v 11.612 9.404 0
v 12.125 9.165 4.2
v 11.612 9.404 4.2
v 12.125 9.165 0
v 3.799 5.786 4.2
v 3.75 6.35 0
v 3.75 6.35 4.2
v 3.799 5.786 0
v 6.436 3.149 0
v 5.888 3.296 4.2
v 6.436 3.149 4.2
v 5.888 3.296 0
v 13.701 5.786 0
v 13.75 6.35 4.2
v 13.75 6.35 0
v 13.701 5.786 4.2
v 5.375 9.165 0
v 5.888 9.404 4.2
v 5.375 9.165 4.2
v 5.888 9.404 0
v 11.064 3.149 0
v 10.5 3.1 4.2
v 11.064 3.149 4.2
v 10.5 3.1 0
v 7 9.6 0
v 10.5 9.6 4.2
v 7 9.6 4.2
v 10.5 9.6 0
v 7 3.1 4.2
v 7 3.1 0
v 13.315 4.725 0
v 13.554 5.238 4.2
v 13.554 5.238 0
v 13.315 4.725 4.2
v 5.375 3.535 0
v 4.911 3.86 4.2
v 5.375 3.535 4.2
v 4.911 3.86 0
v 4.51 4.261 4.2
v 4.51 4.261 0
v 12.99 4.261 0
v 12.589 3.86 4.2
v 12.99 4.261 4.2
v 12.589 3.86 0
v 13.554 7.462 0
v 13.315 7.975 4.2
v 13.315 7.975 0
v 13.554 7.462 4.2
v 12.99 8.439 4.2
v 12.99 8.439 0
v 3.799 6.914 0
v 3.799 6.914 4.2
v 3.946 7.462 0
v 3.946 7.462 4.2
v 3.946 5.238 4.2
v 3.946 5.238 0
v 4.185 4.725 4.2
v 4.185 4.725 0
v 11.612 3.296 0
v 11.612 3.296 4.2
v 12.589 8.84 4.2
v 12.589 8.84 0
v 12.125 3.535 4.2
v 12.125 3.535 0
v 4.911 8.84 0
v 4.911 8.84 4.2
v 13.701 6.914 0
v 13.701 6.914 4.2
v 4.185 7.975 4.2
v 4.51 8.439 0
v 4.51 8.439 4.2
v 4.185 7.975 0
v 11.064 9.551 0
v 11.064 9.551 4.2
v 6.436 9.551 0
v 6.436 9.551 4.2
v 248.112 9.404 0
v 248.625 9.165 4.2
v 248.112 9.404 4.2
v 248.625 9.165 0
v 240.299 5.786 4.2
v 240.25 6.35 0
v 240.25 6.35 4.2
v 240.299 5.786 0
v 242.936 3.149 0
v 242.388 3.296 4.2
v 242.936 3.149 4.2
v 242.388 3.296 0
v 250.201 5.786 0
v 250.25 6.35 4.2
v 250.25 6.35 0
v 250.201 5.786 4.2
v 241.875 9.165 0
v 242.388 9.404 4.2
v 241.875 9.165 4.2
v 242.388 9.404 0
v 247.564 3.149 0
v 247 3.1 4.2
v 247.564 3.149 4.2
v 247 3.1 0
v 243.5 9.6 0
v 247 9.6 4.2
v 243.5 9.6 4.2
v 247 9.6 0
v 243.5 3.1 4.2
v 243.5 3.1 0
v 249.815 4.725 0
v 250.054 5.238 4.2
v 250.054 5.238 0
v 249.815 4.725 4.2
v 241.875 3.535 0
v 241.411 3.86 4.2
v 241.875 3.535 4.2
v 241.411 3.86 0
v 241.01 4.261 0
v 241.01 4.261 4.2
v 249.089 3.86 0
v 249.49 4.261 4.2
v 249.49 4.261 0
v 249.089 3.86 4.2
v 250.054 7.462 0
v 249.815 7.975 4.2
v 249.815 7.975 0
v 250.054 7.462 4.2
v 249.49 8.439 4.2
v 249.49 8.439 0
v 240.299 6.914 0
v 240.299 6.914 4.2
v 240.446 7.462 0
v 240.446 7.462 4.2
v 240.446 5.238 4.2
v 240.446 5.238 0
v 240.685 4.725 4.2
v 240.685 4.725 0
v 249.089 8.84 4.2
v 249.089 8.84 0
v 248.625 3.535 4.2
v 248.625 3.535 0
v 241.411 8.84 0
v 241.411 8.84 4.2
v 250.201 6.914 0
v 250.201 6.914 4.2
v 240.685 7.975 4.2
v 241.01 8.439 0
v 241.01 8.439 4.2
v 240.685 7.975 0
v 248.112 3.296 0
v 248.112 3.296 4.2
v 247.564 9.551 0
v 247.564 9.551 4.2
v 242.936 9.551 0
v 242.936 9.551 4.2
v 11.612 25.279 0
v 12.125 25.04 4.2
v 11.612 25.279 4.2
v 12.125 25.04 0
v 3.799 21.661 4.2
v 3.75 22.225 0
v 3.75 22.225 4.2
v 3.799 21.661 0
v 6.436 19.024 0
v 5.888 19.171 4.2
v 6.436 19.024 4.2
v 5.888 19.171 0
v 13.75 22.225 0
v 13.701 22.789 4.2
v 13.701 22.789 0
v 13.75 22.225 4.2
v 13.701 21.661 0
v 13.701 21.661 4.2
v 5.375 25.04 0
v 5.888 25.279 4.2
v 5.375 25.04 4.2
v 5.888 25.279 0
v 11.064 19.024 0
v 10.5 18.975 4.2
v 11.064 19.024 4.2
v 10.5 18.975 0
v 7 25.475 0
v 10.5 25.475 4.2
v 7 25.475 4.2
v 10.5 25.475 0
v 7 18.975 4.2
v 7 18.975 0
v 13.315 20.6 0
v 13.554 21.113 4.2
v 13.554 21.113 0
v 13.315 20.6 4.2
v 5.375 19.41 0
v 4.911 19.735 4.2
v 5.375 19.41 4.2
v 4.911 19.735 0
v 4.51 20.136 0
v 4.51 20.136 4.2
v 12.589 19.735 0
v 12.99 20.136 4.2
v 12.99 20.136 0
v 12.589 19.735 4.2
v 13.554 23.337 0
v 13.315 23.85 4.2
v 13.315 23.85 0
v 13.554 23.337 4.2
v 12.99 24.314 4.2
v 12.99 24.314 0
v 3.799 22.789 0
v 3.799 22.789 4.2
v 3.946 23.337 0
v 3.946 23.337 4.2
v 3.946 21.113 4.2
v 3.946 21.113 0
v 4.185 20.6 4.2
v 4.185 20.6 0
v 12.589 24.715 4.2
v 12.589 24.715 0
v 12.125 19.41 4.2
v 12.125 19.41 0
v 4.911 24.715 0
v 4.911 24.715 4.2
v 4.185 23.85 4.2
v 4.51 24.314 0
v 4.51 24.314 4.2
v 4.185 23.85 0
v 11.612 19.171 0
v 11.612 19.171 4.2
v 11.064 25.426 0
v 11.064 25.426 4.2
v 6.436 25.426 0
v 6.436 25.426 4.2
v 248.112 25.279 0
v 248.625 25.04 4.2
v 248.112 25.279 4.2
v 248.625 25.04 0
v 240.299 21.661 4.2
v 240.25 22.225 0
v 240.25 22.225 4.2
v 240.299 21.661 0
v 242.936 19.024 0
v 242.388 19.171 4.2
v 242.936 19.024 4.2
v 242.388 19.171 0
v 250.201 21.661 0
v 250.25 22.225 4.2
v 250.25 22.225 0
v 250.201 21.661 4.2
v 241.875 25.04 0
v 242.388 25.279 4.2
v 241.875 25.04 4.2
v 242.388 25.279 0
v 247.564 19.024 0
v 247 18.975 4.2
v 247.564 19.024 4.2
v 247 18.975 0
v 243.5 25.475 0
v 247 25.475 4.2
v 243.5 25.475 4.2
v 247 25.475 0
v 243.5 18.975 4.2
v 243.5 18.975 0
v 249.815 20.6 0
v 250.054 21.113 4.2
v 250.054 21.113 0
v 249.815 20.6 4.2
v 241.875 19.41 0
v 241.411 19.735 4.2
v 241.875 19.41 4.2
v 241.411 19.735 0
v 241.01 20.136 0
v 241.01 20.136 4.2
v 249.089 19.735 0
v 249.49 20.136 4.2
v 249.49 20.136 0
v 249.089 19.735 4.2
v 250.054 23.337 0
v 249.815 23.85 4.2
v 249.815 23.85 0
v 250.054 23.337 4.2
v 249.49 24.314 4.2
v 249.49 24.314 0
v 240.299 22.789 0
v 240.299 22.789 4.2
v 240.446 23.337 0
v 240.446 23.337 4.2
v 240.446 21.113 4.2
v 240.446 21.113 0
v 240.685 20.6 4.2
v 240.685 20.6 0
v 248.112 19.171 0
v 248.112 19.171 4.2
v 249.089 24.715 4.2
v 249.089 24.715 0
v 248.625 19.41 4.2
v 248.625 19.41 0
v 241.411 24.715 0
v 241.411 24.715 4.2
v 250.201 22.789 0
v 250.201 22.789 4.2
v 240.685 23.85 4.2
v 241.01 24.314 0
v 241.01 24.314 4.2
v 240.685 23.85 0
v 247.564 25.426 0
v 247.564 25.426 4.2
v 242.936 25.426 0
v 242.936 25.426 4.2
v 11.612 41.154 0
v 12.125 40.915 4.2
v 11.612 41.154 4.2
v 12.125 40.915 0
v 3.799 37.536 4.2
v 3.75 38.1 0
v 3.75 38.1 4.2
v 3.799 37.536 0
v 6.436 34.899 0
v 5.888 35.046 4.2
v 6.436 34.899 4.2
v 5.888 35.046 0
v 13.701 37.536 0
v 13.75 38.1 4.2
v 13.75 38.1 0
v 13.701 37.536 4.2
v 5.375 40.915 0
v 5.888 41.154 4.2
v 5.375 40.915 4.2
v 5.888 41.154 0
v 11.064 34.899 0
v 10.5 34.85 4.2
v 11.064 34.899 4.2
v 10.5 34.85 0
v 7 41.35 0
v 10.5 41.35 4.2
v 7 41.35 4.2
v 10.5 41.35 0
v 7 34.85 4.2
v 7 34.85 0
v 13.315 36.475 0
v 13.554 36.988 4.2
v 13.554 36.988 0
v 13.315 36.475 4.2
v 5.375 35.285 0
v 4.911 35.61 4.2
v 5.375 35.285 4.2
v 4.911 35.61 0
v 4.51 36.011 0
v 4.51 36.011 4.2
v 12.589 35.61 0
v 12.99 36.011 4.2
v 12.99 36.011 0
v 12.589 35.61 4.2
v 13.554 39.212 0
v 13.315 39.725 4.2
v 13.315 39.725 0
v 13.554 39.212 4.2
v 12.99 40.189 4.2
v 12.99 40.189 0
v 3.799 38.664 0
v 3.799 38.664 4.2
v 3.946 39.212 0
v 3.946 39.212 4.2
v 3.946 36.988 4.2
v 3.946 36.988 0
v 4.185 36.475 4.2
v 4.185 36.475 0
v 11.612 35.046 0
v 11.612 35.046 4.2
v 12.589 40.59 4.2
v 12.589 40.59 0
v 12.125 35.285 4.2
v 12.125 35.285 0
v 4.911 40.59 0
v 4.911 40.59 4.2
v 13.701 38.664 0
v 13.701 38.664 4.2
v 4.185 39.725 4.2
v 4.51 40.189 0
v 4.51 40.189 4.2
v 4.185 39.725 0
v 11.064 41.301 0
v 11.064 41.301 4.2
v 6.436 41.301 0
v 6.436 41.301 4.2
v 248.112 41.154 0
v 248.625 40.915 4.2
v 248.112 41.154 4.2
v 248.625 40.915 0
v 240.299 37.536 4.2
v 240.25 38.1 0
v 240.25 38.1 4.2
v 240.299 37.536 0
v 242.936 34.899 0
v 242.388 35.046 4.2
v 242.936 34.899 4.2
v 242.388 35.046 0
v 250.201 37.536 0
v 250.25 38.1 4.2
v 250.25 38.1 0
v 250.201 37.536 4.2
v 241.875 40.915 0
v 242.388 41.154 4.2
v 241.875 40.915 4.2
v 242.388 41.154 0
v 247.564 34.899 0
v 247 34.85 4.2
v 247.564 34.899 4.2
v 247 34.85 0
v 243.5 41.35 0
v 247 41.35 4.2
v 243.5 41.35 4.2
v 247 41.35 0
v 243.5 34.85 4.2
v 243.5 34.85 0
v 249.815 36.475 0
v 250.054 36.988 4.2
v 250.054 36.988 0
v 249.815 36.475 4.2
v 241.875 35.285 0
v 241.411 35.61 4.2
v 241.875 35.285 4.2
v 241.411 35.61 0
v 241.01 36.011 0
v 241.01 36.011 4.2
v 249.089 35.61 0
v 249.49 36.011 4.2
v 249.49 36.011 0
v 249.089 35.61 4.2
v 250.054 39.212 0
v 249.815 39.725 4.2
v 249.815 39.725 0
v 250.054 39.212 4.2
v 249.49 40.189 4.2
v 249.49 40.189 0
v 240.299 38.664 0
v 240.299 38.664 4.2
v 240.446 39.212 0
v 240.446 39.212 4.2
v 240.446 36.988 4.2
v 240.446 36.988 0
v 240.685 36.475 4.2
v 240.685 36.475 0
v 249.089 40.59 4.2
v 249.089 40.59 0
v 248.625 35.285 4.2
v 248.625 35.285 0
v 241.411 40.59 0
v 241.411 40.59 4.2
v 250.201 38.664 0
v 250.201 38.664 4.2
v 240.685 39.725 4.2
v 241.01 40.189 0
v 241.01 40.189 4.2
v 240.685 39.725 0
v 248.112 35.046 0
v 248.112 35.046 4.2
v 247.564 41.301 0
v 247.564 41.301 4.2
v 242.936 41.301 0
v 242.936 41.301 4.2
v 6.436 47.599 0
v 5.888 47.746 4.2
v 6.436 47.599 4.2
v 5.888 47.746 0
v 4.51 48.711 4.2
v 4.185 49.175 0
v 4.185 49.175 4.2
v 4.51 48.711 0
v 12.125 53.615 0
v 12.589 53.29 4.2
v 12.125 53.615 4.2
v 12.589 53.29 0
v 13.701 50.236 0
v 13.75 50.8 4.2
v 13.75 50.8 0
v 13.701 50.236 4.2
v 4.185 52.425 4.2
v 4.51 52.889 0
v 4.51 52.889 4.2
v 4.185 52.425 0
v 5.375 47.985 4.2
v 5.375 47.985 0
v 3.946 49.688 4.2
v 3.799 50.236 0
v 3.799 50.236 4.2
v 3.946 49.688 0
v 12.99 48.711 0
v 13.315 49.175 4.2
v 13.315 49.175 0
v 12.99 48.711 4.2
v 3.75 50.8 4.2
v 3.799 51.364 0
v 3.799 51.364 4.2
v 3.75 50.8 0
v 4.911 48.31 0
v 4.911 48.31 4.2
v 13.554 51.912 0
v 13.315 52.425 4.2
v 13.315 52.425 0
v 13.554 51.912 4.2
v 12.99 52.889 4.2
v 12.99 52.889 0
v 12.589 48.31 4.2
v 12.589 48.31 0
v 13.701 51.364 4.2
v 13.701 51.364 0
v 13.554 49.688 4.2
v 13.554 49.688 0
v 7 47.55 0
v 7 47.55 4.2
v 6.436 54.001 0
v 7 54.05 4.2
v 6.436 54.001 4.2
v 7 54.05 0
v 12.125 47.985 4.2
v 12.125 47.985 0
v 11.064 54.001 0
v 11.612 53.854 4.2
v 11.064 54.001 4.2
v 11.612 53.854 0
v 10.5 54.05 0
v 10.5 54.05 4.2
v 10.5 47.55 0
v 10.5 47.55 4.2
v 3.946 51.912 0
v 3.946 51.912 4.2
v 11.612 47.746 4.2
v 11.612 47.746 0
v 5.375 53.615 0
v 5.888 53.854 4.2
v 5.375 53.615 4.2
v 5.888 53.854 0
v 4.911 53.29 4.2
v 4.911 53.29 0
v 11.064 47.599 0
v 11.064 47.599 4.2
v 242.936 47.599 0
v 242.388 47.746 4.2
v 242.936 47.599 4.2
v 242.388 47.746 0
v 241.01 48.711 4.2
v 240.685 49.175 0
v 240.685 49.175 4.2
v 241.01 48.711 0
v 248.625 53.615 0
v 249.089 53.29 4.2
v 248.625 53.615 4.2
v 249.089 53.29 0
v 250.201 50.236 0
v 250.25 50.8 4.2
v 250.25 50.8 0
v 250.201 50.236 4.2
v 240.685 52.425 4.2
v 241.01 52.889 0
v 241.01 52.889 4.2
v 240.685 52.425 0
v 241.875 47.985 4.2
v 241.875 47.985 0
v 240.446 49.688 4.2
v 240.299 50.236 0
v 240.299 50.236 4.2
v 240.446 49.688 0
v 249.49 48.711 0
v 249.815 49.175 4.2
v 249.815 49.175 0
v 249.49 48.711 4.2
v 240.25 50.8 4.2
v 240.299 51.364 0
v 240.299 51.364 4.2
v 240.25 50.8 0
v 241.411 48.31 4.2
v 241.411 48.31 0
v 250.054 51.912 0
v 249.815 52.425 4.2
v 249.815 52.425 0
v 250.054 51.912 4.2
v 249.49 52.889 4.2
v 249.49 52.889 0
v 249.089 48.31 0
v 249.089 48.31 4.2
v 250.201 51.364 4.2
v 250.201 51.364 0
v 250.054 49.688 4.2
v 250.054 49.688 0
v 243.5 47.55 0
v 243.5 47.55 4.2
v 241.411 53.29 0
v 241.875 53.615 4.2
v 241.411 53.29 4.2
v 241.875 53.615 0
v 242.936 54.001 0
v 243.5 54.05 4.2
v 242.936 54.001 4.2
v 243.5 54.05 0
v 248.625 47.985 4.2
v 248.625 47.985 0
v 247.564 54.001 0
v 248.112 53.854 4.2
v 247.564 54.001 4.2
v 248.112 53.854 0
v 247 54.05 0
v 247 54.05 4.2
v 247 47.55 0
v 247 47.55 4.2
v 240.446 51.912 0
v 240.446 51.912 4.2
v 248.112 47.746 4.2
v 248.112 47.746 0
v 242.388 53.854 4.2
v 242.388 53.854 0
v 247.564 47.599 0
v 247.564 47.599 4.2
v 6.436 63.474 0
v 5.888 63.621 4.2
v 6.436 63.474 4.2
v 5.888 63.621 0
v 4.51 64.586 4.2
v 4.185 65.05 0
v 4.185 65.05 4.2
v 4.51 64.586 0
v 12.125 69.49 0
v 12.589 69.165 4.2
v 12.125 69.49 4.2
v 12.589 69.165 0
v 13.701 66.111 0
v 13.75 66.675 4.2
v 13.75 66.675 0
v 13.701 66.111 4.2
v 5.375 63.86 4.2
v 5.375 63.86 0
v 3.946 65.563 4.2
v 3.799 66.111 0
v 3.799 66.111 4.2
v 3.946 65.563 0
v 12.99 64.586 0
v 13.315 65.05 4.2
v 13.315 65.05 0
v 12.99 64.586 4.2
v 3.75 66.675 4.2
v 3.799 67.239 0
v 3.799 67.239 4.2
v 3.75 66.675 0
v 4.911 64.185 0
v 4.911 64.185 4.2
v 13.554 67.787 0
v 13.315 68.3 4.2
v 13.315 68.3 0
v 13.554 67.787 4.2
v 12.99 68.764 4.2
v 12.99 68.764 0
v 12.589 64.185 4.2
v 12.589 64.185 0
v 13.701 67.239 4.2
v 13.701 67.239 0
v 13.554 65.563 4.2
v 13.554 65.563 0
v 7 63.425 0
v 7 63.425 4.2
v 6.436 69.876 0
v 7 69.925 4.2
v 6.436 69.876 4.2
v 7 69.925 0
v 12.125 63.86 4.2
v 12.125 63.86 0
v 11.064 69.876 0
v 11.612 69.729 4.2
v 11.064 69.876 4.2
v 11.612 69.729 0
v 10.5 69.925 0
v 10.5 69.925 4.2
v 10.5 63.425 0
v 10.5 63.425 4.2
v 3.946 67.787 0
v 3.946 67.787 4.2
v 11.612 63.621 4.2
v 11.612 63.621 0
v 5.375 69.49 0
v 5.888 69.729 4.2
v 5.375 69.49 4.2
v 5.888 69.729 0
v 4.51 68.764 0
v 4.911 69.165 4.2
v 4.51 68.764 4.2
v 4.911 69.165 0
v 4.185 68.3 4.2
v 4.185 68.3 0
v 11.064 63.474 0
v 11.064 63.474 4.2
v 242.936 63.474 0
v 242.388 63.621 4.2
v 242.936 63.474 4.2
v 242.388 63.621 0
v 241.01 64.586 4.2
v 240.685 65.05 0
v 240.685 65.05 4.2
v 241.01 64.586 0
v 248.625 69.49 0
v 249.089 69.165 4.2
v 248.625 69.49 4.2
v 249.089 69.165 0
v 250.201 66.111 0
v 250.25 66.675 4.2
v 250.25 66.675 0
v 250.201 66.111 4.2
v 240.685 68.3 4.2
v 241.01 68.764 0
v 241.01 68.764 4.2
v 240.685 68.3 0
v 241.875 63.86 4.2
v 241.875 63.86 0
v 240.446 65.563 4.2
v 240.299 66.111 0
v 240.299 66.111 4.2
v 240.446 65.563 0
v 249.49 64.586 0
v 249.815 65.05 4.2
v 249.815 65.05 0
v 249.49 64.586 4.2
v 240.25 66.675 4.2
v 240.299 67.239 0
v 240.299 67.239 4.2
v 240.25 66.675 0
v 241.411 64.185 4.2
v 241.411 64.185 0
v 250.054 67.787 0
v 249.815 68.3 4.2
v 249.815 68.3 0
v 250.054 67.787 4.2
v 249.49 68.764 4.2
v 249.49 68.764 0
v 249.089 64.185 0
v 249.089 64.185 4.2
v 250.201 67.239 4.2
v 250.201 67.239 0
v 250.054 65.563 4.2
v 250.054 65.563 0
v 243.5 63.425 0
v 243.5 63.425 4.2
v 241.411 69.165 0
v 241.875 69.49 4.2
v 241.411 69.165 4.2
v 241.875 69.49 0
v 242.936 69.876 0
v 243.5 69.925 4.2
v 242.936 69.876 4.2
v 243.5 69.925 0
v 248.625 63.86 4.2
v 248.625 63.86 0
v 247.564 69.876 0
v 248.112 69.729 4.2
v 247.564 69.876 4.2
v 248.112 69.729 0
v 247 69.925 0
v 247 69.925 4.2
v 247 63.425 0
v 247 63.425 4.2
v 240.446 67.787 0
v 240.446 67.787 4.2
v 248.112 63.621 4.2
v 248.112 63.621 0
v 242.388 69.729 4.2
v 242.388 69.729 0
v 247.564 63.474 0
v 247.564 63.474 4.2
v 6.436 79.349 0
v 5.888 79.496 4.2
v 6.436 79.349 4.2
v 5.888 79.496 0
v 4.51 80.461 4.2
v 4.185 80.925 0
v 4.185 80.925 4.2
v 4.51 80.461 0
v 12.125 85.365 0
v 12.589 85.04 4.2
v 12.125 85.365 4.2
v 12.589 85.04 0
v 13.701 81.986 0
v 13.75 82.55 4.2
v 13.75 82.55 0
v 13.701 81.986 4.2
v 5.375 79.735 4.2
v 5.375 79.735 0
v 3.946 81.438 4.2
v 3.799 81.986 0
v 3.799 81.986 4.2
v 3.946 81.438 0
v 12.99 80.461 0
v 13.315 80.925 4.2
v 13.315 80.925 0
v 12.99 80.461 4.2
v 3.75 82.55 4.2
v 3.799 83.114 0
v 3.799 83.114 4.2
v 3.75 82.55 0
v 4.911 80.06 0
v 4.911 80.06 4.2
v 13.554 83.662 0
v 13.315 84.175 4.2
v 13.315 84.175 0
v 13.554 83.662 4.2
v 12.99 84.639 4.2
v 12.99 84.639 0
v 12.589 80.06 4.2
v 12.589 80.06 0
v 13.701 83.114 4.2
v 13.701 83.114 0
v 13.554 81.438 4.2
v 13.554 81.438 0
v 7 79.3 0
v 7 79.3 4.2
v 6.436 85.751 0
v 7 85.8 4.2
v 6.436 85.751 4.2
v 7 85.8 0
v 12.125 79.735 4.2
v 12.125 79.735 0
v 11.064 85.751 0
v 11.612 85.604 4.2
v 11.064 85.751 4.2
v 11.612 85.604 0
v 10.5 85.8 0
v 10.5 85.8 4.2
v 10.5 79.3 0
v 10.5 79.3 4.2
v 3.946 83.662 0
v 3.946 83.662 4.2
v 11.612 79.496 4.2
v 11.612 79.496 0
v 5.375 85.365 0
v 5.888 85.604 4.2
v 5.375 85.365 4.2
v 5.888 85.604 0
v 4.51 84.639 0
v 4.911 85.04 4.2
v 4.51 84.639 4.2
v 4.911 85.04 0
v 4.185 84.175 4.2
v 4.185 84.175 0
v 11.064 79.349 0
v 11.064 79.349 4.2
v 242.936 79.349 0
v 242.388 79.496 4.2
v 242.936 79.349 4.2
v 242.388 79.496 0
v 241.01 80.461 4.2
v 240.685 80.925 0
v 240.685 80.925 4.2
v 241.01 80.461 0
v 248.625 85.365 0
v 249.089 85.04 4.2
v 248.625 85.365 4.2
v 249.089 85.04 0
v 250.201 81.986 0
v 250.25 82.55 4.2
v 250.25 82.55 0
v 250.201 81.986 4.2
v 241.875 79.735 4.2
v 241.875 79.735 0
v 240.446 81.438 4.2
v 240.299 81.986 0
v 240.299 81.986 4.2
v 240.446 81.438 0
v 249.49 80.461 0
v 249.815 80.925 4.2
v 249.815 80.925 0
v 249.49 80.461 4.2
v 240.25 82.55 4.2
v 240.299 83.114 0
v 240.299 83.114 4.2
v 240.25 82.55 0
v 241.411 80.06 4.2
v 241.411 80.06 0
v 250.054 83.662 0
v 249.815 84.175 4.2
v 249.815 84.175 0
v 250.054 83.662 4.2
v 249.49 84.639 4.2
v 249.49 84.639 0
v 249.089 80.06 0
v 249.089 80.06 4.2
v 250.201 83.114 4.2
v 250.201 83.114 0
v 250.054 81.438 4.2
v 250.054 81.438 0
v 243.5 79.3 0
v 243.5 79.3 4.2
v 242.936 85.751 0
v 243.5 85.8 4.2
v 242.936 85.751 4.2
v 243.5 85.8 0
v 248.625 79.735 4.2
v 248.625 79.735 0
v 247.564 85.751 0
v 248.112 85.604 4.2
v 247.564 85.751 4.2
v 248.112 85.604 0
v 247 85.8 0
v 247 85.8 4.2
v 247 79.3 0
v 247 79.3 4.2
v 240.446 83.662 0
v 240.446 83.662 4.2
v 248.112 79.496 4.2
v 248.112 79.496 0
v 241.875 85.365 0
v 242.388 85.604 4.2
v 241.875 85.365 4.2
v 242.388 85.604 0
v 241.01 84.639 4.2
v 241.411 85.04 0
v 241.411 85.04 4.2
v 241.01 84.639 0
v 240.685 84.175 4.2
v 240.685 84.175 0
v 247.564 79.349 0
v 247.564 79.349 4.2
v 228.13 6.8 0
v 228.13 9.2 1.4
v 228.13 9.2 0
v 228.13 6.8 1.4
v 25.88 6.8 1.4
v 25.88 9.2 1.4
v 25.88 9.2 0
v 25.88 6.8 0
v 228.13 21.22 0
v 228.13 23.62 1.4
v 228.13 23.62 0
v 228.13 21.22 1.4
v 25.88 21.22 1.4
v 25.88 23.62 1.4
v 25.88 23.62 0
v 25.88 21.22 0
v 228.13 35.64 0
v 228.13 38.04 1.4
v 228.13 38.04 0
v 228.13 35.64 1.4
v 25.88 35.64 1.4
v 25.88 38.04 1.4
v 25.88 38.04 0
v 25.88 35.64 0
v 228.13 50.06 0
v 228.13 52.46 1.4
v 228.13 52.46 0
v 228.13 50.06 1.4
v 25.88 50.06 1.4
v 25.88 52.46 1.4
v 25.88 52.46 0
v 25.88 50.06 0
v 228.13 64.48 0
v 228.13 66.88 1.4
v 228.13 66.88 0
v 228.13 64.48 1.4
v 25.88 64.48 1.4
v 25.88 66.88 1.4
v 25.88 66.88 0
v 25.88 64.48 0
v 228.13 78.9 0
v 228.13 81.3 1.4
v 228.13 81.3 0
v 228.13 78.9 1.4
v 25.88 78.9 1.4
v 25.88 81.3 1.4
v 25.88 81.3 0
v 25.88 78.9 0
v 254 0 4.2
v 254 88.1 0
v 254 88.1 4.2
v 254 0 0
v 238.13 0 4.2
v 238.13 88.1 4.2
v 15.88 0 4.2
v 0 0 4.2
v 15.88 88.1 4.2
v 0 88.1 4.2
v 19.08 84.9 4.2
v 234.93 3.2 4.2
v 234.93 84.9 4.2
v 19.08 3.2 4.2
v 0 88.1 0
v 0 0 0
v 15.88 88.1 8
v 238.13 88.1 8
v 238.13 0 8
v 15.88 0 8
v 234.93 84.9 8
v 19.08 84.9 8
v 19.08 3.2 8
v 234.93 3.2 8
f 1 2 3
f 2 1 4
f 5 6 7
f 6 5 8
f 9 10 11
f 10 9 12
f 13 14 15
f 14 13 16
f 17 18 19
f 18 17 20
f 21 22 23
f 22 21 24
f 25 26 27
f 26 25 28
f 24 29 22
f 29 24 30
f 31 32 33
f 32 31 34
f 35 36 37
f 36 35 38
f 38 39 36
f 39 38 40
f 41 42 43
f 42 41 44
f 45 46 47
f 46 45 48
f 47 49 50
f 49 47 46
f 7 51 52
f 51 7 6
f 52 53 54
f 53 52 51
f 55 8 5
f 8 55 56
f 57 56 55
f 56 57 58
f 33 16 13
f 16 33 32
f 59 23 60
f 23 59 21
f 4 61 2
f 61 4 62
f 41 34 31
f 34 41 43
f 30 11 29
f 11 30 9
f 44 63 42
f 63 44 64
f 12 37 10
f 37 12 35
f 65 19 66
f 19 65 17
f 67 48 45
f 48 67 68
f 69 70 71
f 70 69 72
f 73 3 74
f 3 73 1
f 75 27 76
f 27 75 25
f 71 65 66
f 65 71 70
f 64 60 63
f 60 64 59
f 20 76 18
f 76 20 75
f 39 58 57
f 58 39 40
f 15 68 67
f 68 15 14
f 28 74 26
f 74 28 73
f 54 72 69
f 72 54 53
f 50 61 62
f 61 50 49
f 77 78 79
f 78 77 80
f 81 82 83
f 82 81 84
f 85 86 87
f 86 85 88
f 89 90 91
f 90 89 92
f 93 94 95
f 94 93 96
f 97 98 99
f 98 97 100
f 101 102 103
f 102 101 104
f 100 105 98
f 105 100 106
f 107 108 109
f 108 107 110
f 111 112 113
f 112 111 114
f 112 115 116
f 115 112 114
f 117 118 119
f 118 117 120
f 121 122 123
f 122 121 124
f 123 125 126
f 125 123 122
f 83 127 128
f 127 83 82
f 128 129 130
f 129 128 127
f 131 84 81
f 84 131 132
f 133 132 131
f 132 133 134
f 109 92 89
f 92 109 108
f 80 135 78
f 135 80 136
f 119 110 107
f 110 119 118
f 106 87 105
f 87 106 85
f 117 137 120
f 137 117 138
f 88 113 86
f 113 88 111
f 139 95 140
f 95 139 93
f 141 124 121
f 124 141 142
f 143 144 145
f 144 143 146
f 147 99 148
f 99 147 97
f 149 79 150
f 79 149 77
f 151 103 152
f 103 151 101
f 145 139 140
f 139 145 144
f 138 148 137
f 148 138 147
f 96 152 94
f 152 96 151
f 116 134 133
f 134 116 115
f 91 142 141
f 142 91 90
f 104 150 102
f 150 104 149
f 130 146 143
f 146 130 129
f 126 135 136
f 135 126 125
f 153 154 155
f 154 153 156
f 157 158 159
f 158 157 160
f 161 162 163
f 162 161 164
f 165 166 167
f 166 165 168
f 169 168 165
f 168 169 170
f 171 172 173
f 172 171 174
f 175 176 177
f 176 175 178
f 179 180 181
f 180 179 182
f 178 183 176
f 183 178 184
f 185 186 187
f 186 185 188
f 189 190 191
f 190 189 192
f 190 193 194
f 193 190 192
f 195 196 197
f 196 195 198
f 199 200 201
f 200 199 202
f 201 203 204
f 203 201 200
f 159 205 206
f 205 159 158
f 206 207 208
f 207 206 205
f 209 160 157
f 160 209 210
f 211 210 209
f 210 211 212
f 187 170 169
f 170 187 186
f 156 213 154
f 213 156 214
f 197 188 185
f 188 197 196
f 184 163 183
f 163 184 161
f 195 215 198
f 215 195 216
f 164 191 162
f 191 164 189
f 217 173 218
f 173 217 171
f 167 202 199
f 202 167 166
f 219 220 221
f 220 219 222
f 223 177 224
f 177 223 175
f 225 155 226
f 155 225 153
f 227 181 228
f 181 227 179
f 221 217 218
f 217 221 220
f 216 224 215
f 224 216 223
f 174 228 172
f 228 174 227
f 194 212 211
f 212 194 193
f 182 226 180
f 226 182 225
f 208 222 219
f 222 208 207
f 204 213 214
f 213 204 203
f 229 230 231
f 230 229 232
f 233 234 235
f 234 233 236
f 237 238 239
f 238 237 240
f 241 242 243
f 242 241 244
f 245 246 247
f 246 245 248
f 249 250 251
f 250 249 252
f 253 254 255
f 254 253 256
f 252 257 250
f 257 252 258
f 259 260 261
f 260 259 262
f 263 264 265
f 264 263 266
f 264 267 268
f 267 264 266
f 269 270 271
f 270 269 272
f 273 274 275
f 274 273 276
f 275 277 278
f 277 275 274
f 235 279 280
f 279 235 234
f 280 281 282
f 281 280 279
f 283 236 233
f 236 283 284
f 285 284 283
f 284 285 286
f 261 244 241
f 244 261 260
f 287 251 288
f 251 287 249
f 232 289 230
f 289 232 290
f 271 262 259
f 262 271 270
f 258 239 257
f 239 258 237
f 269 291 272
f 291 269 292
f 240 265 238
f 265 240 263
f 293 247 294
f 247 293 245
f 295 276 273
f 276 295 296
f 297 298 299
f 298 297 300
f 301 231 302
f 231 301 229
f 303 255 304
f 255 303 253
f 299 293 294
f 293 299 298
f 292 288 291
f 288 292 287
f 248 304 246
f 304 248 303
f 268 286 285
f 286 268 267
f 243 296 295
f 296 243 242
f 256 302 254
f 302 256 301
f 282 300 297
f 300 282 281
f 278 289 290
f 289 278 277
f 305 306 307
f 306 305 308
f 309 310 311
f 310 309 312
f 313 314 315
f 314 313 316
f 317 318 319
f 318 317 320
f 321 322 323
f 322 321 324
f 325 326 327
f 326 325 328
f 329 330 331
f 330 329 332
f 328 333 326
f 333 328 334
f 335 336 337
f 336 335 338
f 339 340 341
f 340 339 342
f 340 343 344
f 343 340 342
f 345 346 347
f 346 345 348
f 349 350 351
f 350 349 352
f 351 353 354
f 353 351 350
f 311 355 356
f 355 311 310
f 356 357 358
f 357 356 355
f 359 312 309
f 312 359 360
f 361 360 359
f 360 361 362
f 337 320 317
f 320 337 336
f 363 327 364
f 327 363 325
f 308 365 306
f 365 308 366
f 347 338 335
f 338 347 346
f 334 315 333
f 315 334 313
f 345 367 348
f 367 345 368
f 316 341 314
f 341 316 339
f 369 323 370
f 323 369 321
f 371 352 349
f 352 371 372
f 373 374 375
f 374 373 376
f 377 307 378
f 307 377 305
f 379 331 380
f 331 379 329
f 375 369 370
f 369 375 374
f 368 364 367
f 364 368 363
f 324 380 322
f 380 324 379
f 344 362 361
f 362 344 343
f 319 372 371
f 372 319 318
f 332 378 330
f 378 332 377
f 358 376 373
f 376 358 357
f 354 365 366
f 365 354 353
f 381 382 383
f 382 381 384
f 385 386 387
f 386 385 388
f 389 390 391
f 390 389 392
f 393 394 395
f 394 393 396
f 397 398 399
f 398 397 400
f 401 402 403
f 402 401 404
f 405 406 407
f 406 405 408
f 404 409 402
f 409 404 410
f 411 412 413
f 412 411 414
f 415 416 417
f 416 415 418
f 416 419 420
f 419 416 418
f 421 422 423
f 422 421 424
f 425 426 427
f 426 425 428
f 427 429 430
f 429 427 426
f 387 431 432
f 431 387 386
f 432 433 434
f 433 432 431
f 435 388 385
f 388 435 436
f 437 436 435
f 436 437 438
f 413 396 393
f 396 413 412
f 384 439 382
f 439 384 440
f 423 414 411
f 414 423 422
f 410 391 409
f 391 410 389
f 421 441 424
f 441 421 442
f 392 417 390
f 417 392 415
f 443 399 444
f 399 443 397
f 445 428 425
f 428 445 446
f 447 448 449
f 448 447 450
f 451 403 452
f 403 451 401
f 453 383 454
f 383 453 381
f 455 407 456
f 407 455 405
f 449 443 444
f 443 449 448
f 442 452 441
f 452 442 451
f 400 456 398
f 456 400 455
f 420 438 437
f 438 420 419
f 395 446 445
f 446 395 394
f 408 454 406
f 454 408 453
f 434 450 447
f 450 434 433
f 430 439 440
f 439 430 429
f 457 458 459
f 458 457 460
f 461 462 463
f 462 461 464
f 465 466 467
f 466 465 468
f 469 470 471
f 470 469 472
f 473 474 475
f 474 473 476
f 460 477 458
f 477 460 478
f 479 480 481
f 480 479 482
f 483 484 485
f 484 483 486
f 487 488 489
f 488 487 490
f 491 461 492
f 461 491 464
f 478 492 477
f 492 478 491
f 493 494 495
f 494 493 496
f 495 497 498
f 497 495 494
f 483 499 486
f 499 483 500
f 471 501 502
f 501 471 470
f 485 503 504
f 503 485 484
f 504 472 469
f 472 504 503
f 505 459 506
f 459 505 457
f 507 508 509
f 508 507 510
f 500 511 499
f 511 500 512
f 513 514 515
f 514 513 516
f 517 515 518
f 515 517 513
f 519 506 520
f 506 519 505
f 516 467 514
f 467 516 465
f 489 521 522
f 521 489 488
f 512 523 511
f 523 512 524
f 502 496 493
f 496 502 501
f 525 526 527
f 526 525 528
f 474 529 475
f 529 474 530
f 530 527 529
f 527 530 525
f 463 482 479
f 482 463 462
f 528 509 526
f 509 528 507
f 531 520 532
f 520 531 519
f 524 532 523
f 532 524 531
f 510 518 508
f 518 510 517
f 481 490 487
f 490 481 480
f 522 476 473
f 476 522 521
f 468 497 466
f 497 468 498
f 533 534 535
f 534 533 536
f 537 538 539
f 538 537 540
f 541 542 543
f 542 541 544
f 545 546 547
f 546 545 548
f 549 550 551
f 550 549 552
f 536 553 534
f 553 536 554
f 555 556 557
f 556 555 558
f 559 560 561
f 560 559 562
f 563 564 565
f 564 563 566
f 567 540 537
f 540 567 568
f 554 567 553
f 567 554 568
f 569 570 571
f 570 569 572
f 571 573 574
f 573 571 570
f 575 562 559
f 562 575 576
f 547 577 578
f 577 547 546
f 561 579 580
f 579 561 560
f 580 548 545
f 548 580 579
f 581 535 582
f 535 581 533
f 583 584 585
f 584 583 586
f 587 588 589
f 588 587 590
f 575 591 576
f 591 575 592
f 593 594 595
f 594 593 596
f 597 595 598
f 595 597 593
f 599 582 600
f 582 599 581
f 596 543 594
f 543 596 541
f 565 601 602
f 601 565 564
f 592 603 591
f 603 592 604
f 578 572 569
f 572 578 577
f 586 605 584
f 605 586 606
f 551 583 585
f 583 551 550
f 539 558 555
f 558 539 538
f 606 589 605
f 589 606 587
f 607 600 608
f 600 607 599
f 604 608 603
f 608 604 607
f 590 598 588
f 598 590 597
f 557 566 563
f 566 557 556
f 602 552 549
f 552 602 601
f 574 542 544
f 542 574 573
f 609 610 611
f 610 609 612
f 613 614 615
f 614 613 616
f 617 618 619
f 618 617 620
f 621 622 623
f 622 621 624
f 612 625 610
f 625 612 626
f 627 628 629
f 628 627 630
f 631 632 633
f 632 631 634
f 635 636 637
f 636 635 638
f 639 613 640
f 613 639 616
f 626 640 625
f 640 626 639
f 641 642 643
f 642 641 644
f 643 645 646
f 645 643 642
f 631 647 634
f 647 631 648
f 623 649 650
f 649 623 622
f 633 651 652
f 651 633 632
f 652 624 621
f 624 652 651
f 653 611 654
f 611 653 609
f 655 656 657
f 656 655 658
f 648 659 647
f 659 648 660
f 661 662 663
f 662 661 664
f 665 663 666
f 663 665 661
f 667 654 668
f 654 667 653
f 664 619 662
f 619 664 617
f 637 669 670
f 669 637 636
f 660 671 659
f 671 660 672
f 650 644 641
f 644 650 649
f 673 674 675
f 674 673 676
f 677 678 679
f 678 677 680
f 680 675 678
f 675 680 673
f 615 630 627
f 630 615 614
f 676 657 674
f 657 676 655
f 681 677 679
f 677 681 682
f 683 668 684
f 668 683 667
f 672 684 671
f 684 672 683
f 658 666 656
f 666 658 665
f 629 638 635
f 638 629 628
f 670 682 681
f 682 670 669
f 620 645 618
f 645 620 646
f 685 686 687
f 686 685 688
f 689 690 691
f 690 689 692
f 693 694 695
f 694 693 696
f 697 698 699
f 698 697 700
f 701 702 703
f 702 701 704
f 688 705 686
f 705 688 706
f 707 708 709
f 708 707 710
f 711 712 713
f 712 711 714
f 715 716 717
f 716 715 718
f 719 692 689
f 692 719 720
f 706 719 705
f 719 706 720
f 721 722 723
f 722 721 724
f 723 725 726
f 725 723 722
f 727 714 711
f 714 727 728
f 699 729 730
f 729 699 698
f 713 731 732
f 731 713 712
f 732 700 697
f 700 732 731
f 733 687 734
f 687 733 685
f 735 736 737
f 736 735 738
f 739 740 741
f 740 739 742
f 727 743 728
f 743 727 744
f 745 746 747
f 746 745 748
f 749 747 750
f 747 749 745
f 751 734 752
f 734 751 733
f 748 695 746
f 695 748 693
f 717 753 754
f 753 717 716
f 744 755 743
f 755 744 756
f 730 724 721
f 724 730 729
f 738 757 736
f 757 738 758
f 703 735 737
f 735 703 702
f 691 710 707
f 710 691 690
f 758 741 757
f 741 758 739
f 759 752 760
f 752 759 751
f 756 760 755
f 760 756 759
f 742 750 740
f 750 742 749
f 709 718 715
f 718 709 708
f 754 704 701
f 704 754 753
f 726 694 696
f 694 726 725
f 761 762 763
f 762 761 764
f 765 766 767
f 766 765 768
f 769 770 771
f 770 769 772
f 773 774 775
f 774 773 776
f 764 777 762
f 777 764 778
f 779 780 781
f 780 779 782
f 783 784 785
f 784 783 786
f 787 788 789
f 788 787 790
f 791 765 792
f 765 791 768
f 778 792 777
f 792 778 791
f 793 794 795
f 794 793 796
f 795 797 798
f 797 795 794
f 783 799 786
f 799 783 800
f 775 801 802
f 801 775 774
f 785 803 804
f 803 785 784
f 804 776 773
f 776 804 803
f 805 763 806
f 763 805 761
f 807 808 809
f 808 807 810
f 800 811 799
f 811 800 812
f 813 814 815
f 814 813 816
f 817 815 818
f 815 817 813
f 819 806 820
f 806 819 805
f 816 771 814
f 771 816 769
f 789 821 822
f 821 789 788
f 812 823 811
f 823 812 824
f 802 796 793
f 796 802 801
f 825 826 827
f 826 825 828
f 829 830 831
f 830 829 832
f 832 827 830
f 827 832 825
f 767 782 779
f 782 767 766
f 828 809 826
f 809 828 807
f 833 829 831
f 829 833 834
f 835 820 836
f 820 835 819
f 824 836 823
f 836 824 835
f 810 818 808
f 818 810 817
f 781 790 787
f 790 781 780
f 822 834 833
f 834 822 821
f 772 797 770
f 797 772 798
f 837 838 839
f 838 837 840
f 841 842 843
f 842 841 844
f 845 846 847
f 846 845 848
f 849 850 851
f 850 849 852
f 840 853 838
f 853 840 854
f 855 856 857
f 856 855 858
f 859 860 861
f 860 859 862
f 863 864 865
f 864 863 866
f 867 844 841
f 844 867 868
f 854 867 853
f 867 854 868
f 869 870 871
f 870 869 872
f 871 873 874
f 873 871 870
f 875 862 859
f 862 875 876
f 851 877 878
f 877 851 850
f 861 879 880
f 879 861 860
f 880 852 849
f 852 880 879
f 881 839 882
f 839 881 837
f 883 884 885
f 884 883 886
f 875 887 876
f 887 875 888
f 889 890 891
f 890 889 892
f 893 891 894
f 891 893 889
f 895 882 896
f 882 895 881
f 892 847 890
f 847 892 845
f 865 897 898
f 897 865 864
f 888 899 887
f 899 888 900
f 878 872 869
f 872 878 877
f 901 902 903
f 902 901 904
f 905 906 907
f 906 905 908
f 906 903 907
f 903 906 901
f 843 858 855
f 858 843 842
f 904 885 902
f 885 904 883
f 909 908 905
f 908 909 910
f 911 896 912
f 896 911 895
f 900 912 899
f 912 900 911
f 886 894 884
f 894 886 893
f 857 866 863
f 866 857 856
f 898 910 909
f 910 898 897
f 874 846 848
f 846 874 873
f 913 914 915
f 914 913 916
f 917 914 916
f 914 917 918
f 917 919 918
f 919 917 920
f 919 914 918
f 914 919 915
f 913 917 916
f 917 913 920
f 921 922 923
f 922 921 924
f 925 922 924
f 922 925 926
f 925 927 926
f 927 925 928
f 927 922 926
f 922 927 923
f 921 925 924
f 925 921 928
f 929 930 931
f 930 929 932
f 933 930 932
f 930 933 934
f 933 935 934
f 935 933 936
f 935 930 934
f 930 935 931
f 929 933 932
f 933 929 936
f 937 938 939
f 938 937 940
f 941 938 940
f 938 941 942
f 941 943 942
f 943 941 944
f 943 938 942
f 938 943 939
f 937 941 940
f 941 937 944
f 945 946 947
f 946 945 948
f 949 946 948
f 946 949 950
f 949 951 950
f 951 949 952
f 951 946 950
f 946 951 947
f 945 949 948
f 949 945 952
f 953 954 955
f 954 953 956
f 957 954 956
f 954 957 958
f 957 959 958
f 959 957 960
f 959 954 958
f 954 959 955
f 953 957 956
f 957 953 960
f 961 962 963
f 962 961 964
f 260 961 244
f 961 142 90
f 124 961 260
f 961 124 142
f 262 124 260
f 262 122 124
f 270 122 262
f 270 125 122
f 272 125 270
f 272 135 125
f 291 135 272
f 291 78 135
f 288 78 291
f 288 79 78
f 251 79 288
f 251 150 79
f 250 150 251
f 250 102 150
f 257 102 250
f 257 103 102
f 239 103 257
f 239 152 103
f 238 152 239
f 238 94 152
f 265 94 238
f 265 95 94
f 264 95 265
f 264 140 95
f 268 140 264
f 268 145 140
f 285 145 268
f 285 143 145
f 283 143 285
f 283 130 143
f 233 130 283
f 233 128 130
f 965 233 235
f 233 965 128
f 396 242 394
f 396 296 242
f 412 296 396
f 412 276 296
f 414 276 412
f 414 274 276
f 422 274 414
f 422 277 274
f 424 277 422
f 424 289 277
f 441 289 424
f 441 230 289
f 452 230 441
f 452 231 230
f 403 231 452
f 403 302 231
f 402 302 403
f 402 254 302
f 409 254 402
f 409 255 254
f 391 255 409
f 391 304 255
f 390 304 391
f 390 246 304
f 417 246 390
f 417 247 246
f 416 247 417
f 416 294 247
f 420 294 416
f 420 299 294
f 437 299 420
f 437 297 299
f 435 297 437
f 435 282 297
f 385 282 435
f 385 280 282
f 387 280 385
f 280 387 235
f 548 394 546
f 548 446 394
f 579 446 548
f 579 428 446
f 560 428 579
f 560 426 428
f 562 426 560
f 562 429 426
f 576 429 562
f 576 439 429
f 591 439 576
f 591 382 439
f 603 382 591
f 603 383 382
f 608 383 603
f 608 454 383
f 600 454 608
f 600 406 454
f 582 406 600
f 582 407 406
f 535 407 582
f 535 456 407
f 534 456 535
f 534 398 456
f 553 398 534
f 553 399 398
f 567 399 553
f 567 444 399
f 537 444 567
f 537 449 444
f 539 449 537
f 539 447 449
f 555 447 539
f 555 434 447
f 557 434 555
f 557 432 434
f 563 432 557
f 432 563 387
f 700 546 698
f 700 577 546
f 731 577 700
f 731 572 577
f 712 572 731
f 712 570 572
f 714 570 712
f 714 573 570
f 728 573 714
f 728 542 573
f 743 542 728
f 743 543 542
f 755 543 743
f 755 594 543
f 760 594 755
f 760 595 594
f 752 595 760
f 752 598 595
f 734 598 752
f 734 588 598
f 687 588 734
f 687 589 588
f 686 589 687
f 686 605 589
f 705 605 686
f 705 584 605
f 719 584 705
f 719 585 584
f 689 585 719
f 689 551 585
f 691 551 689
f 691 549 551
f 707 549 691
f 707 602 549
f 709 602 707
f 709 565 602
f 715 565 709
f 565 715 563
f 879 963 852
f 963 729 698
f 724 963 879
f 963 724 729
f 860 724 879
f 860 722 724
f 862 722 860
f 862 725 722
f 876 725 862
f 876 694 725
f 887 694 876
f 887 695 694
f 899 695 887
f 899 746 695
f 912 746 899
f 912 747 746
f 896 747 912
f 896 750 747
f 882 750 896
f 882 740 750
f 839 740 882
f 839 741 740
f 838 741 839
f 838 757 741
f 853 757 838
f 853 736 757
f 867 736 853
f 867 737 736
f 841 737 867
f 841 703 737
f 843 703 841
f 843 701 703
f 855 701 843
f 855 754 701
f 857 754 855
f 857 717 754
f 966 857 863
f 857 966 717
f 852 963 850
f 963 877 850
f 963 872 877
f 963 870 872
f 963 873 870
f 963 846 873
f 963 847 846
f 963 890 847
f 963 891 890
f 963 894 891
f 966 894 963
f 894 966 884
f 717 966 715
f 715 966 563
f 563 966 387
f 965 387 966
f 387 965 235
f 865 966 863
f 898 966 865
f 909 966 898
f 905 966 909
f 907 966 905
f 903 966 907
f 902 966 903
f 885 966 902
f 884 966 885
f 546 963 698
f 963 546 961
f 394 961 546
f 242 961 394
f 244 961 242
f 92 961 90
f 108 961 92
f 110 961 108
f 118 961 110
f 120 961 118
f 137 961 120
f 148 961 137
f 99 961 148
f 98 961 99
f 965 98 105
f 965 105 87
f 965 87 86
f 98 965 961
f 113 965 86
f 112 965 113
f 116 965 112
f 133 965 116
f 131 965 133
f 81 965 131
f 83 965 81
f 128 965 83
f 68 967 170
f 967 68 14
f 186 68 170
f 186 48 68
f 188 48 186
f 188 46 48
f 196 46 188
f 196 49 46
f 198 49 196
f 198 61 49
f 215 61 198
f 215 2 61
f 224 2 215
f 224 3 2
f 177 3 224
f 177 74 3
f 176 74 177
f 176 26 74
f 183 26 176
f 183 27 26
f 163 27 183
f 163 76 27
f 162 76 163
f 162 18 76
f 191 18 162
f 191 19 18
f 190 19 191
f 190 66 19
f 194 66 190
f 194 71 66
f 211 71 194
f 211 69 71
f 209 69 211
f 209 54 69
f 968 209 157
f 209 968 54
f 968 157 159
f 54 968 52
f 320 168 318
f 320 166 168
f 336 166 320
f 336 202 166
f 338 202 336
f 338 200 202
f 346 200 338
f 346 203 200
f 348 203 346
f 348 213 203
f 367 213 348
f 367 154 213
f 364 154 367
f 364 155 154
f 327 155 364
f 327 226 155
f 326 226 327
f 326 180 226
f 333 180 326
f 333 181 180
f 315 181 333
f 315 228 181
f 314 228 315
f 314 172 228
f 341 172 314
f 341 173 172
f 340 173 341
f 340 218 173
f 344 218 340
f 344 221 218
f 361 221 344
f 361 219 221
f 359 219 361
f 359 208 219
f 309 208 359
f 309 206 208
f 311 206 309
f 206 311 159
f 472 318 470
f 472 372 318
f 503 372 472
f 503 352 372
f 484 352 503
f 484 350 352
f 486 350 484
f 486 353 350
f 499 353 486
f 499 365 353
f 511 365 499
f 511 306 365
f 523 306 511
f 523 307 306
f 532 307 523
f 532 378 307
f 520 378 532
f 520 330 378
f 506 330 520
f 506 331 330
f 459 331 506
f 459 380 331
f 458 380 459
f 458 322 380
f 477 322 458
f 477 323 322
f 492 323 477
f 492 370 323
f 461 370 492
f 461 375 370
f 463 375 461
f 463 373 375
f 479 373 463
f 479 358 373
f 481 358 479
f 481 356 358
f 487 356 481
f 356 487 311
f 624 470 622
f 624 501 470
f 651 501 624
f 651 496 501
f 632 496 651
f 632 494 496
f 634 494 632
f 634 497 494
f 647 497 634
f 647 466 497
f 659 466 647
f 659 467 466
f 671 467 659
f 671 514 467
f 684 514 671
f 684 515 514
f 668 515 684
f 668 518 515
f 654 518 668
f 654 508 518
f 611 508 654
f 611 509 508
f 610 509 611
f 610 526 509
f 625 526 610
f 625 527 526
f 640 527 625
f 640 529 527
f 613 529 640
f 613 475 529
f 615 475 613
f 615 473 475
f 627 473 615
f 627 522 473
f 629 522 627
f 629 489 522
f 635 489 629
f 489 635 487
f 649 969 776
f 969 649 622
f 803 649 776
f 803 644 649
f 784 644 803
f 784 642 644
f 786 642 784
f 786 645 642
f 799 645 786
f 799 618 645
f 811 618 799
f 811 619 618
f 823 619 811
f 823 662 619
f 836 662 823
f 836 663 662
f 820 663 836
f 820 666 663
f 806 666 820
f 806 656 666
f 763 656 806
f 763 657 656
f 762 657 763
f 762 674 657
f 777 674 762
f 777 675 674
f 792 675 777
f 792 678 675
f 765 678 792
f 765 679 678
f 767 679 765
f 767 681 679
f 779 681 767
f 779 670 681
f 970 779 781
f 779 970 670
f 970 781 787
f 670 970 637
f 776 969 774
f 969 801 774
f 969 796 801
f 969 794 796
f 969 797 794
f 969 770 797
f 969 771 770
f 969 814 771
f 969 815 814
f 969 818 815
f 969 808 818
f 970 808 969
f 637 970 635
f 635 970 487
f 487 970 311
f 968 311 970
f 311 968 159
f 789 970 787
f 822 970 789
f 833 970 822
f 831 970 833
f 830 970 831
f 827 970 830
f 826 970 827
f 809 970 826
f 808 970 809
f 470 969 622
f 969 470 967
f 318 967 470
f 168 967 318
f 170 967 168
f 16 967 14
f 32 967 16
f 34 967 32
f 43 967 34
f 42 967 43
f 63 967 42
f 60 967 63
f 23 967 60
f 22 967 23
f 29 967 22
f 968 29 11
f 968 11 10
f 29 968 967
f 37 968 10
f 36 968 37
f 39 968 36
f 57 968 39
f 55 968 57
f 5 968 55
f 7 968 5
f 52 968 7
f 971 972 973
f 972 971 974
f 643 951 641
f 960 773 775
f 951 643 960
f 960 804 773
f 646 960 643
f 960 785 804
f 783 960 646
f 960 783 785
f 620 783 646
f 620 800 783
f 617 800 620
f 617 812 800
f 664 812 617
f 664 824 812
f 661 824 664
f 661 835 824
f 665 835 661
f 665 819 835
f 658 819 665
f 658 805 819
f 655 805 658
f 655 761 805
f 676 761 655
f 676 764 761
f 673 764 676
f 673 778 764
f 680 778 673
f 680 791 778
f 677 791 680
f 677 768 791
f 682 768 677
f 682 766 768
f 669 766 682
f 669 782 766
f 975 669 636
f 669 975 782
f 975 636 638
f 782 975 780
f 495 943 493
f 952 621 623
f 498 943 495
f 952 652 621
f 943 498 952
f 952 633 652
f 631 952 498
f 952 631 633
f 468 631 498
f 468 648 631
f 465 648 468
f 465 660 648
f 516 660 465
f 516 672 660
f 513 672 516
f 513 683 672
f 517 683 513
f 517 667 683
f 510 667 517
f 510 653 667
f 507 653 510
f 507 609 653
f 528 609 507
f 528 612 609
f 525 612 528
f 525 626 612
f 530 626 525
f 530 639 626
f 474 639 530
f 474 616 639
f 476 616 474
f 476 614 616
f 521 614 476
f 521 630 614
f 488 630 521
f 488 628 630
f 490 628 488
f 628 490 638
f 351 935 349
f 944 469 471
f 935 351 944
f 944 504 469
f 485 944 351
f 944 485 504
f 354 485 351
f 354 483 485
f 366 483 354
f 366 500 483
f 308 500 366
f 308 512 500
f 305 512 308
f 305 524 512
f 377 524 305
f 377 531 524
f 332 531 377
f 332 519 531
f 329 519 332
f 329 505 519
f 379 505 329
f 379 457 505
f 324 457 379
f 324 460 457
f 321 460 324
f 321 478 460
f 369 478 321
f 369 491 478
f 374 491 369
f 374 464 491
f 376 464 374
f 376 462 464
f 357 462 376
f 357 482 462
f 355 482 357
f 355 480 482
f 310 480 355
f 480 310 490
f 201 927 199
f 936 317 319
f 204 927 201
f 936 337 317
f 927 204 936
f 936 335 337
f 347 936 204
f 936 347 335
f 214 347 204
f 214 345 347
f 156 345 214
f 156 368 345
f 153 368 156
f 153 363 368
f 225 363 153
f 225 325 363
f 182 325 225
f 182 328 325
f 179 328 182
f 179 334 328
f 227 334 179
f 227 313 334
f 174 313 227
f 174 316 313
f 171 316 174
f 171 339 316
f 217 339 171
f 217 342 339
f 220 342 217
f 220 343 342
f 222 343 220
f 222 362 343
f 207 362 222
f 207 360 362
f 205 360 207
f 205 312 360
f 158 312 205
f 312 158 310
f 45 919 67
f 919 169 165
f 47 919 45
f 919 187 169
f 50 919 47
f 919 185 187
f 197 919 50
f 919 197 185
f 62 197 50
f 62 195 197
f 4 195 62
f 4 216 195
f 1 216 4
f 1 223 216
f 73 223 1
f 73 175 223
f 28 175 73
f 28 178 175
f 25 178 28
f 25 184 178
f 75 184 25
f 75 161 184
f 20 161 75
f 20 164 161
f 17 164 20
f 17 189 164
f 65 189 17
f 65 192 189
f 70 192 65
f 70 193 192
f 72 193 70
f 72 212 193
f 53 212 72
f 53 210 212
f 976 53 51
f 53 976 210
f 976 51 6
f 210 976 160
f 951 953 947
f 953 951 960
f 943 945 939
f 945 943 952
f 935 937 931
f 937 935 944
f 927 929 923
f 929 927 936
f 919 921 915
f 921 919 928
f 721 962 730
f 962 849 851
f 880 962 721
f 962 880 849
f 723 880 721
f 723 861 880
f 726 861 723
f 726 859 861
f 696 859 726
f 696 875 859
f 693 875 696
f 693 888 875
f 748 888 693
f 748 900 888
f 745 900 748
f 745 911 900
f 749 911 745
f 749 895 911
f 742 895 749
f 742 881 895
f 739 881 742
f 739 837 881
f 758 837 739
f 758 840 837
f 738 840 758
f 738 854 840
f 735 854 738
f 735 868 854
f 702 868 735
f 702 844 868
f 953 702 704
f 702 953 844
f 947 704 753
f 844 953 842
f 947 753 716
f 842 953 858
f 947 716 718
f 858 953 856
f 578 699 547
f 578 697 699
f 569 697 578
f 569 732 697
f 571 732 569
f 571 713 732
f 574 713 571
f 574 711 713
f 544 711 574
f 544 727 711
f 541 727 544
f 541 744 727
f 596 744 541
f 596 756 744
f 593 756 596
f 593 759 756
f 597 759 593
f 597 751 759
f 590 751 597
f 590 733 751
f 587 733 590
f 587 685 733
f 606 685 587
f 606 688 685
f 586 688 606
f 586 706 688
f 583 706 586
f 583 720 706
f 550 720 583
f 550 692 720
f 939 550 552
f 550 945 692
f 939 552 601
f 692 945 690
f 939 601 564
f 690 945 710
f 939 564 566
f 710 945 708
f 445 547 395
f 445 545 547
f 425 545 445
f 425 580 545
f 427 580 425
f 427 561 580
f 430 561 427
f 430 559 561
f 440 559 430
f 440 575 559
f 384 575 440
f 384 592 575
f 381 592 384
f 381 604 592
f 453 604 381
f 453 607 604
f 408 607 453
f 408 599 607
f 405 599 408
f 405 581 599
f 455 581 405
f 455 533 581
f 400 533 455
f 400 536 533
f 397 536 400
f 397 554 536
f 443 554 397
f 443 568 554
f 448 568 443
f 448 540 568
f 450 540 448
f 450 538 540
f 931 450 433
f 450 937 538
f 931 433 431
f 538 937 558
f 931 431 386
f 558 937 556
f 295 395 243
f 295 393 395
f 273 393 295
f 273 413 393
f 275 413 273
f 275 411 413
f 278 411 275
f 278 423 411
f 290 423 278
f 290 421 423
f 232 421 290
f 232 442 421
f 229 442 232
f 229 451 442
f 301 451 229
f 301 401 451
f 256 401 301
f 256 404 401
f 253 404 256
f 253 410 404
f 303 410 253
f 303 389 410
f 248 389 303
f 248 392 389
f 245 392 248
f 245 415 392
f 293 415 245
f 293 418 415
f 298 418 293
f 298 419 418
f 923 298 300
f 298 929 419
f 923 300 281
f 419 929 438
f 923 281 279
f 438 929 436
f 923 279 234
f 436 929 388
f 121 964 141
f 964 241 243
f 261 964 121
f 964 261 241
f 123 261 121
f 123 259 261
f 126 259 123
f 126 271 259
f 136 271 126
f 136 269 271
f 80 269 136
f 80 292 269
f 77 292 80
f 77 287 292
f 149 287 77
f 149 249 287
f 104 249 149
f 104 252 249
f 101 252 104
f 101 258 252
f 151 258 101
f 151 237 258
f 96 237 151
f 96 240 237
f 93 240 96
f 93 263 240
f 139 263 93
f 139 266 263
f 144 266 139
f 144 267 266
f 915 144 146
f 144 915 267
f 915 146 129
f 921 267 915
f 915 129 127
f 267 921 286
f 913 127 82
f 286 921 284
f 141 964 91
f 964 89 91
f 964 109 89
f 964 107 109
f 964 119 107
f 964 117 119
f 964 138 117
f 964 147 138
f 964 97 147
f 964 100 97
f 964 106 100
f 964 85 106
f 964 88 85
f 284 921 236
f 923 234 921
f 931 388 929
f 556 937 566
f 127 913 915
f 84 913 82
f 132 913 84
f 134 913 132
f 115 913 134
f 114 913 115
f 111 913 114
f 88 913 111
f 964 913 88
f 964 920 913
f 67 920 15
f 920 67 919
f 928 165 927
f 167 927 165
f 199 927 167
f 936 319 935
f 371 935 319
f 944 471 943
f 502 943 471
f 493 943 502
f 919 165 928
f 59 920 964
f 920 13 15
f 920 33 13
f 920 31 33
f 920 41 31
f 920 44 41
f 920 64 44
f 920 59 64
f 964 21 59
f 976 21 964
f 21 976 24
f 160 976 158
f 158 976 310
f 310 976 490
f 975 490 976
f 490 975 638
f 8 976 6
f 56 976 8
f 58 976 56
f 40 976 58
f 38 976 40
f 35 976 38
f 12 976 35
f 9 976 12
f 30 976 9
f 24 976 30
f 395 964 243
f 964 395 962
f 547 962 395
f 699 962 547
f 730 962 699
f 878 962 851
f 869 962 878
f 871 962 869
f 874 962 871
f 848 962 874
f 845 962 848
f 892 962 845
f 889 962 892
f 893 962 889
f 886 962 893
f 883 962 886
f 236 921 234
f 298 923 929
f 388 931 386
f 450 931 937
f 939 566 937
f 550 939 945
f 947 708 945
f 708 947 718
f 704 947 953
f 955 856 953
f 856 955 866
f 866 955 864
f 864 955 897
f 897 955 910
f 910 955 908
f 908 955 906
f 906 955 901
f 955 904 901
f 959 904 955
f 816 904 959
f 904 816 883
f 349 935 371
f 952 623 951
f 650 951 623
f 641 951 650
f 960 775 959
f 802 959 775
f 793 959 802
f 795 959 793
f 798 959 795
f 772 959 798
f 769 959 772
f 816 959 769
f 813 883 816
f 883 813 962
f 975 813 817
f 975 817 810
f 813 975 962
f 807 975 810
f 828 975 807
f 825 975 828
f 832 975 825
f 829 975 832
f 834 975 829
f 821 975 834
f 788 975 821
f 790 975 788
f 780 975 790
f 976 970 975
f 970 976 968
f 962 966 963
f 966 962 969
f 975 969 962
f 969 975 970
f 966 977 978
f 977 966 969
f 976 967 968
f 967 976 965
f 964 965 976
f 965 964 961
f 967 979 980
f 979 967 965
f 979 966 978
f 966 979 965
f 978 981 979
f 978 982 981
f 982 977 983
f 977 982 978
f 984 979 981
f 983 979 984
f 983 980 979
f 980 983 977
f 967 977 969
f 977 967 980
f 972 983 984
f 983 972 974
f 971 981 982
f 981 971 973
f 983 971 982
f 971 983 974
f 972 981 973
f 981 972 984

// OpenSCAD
// ============================================================================
// RackArchitect MCP — Parametric 3D-Printable Slot Cover Panel (.scad)
// Blueprint: Community 3D-Print 10-Inch 2U Designer Cover Panel (Horizontal Precision Lines) (3dprint-10inch-cover-panel-lines-2u)
// Standard:  10INCH EIA-310 (254mm Total Width, 2U = 88.1mm)
// Pattern:   LINES (Closed Front Faceplate — Zero Cable Pass-Through)
// Material:  PETG / PLA
// ============================================================================

/* [EIA-310 Cover Panel Parameters (mm)] */
panel_width_mm = 254;
aperture_width_mm = 222.25;
hole_center_pitch_x_mm = 236.5;
panel_height_mm = 88.1;
u_count = 2;
faceplate_thickness_mm = 4.2;
stiffener_depth_mm = 8;
stiffener_wall_mm = 3.2;
pattern_groove_depth_mm = 1.4;
$fn = 36;

module oval_mounting_slot(slot_w = 10.0, slot_h = 6.5, thickness = 10.0) {
  hull() {
    translate([-(slot_w - slot_h) / 2, 0, -1]) cylinder(d = slot_h, h = thickness);
    translate([ (slot_w - slot_h) / 2, 0, -1]) cylinder(d = slot_h, h = thickness);
  }
}

module eia310_ear_holes() {
  left_hole_x = (panel_width_mm - hole_center_pitch_x_mm) / 2;
  right_hole_x = panel_width_mm - left_hole_x;
  for (u = [0 : u_count - 1]) {
    base_y = u * 44.45;
    for (offset_y = [6.35, 22.225, 38.10]) {
      if (base_y + offset_y < panel_height_mm - 3.0) {
        translate([left_hole_x, base_y + offset_y, 0]) oval_mounting_slot();
        translate([right_hole_x, base_y + offset_y, 0]) oval_mounting_slot();
      }
    }
  }
}

module front_surface_pattern_grooves() {
  // Horizontal precision decorative grooves (6 lines, blind depth = 1.4mm)
  translate([25.88, 6.8, -0.5]) cube([202.25, 2.4, pattern_groove_depth_mm + 0.5]);
  translate([25.88, 21.22, -0.5]) cube([202.25, 2.4, pattern_groove_depth_mm + 0.5]);
  translate([25.88, 35.64, -0.5]) cube([202.25, 2.4, pattern_groove_depth_mm + 0.5]);
  translate([25.88, 50.06, -0.5]) cube([202.25, 2.4, pattern_groove_depth_mm + 0.5]);
  translate([25.88, 64.48, -0.5]) cube([202.25, 2.4, pattern_groove_depth_mm + 0.5]);
  translate([25.88, 78.9, -0.5]) cube([202.25, 2.4, pattern_groove_depth_mm + 0.5]);
}

module slot_bay_cutouts() {
  // Closed blanking cover panel (zero through-holes; front relief grooves only)
  front_surface_pattern_grooves();
}

module rear_perimeter_stiffener_frame() {
  flange_h = stiffener_depth_mm - faceplate_thickness_mm;
  if (flange_h > 0.5) {
    // Bottom & Top horizontal stiffening ribs
    translate([15.88, 0, faceplate_thickness_mm]) cube([aperture_width_mm, stiffener_wall_mm, flange_h]);
    translate([15.88, panel_height_mm - stiffener_wall_mm, faceplate_thickness_mm]) cube([aperture_width_mm, stiffener_wall_mm, flange_h]);
    // Left & Right vertical stiffening ribs
    translate([15.88, 0, faceplate_thickness_mm]) cube([stiffener_wall_mm, panel_height_mm, flange_h]);
    translate([15.88 + aperture_width_mm - stiffener_wall_mm, 0, faceplate_thickness_mm]) cube([stiffener_wall_mm, panel_height_mm, flange_h]);
  }
}

module rack_carrier_assembly() {
  union() {
    difference() {
      cube([panel_width_mm, panel_height_mm, faceplate_thickness_mm]);
      eia310_ear_holes();
      slot_bay_cutouts();
    }
    rear_perimeter_stiffener_frame();
  }
}

rack_carrier_assembly();
